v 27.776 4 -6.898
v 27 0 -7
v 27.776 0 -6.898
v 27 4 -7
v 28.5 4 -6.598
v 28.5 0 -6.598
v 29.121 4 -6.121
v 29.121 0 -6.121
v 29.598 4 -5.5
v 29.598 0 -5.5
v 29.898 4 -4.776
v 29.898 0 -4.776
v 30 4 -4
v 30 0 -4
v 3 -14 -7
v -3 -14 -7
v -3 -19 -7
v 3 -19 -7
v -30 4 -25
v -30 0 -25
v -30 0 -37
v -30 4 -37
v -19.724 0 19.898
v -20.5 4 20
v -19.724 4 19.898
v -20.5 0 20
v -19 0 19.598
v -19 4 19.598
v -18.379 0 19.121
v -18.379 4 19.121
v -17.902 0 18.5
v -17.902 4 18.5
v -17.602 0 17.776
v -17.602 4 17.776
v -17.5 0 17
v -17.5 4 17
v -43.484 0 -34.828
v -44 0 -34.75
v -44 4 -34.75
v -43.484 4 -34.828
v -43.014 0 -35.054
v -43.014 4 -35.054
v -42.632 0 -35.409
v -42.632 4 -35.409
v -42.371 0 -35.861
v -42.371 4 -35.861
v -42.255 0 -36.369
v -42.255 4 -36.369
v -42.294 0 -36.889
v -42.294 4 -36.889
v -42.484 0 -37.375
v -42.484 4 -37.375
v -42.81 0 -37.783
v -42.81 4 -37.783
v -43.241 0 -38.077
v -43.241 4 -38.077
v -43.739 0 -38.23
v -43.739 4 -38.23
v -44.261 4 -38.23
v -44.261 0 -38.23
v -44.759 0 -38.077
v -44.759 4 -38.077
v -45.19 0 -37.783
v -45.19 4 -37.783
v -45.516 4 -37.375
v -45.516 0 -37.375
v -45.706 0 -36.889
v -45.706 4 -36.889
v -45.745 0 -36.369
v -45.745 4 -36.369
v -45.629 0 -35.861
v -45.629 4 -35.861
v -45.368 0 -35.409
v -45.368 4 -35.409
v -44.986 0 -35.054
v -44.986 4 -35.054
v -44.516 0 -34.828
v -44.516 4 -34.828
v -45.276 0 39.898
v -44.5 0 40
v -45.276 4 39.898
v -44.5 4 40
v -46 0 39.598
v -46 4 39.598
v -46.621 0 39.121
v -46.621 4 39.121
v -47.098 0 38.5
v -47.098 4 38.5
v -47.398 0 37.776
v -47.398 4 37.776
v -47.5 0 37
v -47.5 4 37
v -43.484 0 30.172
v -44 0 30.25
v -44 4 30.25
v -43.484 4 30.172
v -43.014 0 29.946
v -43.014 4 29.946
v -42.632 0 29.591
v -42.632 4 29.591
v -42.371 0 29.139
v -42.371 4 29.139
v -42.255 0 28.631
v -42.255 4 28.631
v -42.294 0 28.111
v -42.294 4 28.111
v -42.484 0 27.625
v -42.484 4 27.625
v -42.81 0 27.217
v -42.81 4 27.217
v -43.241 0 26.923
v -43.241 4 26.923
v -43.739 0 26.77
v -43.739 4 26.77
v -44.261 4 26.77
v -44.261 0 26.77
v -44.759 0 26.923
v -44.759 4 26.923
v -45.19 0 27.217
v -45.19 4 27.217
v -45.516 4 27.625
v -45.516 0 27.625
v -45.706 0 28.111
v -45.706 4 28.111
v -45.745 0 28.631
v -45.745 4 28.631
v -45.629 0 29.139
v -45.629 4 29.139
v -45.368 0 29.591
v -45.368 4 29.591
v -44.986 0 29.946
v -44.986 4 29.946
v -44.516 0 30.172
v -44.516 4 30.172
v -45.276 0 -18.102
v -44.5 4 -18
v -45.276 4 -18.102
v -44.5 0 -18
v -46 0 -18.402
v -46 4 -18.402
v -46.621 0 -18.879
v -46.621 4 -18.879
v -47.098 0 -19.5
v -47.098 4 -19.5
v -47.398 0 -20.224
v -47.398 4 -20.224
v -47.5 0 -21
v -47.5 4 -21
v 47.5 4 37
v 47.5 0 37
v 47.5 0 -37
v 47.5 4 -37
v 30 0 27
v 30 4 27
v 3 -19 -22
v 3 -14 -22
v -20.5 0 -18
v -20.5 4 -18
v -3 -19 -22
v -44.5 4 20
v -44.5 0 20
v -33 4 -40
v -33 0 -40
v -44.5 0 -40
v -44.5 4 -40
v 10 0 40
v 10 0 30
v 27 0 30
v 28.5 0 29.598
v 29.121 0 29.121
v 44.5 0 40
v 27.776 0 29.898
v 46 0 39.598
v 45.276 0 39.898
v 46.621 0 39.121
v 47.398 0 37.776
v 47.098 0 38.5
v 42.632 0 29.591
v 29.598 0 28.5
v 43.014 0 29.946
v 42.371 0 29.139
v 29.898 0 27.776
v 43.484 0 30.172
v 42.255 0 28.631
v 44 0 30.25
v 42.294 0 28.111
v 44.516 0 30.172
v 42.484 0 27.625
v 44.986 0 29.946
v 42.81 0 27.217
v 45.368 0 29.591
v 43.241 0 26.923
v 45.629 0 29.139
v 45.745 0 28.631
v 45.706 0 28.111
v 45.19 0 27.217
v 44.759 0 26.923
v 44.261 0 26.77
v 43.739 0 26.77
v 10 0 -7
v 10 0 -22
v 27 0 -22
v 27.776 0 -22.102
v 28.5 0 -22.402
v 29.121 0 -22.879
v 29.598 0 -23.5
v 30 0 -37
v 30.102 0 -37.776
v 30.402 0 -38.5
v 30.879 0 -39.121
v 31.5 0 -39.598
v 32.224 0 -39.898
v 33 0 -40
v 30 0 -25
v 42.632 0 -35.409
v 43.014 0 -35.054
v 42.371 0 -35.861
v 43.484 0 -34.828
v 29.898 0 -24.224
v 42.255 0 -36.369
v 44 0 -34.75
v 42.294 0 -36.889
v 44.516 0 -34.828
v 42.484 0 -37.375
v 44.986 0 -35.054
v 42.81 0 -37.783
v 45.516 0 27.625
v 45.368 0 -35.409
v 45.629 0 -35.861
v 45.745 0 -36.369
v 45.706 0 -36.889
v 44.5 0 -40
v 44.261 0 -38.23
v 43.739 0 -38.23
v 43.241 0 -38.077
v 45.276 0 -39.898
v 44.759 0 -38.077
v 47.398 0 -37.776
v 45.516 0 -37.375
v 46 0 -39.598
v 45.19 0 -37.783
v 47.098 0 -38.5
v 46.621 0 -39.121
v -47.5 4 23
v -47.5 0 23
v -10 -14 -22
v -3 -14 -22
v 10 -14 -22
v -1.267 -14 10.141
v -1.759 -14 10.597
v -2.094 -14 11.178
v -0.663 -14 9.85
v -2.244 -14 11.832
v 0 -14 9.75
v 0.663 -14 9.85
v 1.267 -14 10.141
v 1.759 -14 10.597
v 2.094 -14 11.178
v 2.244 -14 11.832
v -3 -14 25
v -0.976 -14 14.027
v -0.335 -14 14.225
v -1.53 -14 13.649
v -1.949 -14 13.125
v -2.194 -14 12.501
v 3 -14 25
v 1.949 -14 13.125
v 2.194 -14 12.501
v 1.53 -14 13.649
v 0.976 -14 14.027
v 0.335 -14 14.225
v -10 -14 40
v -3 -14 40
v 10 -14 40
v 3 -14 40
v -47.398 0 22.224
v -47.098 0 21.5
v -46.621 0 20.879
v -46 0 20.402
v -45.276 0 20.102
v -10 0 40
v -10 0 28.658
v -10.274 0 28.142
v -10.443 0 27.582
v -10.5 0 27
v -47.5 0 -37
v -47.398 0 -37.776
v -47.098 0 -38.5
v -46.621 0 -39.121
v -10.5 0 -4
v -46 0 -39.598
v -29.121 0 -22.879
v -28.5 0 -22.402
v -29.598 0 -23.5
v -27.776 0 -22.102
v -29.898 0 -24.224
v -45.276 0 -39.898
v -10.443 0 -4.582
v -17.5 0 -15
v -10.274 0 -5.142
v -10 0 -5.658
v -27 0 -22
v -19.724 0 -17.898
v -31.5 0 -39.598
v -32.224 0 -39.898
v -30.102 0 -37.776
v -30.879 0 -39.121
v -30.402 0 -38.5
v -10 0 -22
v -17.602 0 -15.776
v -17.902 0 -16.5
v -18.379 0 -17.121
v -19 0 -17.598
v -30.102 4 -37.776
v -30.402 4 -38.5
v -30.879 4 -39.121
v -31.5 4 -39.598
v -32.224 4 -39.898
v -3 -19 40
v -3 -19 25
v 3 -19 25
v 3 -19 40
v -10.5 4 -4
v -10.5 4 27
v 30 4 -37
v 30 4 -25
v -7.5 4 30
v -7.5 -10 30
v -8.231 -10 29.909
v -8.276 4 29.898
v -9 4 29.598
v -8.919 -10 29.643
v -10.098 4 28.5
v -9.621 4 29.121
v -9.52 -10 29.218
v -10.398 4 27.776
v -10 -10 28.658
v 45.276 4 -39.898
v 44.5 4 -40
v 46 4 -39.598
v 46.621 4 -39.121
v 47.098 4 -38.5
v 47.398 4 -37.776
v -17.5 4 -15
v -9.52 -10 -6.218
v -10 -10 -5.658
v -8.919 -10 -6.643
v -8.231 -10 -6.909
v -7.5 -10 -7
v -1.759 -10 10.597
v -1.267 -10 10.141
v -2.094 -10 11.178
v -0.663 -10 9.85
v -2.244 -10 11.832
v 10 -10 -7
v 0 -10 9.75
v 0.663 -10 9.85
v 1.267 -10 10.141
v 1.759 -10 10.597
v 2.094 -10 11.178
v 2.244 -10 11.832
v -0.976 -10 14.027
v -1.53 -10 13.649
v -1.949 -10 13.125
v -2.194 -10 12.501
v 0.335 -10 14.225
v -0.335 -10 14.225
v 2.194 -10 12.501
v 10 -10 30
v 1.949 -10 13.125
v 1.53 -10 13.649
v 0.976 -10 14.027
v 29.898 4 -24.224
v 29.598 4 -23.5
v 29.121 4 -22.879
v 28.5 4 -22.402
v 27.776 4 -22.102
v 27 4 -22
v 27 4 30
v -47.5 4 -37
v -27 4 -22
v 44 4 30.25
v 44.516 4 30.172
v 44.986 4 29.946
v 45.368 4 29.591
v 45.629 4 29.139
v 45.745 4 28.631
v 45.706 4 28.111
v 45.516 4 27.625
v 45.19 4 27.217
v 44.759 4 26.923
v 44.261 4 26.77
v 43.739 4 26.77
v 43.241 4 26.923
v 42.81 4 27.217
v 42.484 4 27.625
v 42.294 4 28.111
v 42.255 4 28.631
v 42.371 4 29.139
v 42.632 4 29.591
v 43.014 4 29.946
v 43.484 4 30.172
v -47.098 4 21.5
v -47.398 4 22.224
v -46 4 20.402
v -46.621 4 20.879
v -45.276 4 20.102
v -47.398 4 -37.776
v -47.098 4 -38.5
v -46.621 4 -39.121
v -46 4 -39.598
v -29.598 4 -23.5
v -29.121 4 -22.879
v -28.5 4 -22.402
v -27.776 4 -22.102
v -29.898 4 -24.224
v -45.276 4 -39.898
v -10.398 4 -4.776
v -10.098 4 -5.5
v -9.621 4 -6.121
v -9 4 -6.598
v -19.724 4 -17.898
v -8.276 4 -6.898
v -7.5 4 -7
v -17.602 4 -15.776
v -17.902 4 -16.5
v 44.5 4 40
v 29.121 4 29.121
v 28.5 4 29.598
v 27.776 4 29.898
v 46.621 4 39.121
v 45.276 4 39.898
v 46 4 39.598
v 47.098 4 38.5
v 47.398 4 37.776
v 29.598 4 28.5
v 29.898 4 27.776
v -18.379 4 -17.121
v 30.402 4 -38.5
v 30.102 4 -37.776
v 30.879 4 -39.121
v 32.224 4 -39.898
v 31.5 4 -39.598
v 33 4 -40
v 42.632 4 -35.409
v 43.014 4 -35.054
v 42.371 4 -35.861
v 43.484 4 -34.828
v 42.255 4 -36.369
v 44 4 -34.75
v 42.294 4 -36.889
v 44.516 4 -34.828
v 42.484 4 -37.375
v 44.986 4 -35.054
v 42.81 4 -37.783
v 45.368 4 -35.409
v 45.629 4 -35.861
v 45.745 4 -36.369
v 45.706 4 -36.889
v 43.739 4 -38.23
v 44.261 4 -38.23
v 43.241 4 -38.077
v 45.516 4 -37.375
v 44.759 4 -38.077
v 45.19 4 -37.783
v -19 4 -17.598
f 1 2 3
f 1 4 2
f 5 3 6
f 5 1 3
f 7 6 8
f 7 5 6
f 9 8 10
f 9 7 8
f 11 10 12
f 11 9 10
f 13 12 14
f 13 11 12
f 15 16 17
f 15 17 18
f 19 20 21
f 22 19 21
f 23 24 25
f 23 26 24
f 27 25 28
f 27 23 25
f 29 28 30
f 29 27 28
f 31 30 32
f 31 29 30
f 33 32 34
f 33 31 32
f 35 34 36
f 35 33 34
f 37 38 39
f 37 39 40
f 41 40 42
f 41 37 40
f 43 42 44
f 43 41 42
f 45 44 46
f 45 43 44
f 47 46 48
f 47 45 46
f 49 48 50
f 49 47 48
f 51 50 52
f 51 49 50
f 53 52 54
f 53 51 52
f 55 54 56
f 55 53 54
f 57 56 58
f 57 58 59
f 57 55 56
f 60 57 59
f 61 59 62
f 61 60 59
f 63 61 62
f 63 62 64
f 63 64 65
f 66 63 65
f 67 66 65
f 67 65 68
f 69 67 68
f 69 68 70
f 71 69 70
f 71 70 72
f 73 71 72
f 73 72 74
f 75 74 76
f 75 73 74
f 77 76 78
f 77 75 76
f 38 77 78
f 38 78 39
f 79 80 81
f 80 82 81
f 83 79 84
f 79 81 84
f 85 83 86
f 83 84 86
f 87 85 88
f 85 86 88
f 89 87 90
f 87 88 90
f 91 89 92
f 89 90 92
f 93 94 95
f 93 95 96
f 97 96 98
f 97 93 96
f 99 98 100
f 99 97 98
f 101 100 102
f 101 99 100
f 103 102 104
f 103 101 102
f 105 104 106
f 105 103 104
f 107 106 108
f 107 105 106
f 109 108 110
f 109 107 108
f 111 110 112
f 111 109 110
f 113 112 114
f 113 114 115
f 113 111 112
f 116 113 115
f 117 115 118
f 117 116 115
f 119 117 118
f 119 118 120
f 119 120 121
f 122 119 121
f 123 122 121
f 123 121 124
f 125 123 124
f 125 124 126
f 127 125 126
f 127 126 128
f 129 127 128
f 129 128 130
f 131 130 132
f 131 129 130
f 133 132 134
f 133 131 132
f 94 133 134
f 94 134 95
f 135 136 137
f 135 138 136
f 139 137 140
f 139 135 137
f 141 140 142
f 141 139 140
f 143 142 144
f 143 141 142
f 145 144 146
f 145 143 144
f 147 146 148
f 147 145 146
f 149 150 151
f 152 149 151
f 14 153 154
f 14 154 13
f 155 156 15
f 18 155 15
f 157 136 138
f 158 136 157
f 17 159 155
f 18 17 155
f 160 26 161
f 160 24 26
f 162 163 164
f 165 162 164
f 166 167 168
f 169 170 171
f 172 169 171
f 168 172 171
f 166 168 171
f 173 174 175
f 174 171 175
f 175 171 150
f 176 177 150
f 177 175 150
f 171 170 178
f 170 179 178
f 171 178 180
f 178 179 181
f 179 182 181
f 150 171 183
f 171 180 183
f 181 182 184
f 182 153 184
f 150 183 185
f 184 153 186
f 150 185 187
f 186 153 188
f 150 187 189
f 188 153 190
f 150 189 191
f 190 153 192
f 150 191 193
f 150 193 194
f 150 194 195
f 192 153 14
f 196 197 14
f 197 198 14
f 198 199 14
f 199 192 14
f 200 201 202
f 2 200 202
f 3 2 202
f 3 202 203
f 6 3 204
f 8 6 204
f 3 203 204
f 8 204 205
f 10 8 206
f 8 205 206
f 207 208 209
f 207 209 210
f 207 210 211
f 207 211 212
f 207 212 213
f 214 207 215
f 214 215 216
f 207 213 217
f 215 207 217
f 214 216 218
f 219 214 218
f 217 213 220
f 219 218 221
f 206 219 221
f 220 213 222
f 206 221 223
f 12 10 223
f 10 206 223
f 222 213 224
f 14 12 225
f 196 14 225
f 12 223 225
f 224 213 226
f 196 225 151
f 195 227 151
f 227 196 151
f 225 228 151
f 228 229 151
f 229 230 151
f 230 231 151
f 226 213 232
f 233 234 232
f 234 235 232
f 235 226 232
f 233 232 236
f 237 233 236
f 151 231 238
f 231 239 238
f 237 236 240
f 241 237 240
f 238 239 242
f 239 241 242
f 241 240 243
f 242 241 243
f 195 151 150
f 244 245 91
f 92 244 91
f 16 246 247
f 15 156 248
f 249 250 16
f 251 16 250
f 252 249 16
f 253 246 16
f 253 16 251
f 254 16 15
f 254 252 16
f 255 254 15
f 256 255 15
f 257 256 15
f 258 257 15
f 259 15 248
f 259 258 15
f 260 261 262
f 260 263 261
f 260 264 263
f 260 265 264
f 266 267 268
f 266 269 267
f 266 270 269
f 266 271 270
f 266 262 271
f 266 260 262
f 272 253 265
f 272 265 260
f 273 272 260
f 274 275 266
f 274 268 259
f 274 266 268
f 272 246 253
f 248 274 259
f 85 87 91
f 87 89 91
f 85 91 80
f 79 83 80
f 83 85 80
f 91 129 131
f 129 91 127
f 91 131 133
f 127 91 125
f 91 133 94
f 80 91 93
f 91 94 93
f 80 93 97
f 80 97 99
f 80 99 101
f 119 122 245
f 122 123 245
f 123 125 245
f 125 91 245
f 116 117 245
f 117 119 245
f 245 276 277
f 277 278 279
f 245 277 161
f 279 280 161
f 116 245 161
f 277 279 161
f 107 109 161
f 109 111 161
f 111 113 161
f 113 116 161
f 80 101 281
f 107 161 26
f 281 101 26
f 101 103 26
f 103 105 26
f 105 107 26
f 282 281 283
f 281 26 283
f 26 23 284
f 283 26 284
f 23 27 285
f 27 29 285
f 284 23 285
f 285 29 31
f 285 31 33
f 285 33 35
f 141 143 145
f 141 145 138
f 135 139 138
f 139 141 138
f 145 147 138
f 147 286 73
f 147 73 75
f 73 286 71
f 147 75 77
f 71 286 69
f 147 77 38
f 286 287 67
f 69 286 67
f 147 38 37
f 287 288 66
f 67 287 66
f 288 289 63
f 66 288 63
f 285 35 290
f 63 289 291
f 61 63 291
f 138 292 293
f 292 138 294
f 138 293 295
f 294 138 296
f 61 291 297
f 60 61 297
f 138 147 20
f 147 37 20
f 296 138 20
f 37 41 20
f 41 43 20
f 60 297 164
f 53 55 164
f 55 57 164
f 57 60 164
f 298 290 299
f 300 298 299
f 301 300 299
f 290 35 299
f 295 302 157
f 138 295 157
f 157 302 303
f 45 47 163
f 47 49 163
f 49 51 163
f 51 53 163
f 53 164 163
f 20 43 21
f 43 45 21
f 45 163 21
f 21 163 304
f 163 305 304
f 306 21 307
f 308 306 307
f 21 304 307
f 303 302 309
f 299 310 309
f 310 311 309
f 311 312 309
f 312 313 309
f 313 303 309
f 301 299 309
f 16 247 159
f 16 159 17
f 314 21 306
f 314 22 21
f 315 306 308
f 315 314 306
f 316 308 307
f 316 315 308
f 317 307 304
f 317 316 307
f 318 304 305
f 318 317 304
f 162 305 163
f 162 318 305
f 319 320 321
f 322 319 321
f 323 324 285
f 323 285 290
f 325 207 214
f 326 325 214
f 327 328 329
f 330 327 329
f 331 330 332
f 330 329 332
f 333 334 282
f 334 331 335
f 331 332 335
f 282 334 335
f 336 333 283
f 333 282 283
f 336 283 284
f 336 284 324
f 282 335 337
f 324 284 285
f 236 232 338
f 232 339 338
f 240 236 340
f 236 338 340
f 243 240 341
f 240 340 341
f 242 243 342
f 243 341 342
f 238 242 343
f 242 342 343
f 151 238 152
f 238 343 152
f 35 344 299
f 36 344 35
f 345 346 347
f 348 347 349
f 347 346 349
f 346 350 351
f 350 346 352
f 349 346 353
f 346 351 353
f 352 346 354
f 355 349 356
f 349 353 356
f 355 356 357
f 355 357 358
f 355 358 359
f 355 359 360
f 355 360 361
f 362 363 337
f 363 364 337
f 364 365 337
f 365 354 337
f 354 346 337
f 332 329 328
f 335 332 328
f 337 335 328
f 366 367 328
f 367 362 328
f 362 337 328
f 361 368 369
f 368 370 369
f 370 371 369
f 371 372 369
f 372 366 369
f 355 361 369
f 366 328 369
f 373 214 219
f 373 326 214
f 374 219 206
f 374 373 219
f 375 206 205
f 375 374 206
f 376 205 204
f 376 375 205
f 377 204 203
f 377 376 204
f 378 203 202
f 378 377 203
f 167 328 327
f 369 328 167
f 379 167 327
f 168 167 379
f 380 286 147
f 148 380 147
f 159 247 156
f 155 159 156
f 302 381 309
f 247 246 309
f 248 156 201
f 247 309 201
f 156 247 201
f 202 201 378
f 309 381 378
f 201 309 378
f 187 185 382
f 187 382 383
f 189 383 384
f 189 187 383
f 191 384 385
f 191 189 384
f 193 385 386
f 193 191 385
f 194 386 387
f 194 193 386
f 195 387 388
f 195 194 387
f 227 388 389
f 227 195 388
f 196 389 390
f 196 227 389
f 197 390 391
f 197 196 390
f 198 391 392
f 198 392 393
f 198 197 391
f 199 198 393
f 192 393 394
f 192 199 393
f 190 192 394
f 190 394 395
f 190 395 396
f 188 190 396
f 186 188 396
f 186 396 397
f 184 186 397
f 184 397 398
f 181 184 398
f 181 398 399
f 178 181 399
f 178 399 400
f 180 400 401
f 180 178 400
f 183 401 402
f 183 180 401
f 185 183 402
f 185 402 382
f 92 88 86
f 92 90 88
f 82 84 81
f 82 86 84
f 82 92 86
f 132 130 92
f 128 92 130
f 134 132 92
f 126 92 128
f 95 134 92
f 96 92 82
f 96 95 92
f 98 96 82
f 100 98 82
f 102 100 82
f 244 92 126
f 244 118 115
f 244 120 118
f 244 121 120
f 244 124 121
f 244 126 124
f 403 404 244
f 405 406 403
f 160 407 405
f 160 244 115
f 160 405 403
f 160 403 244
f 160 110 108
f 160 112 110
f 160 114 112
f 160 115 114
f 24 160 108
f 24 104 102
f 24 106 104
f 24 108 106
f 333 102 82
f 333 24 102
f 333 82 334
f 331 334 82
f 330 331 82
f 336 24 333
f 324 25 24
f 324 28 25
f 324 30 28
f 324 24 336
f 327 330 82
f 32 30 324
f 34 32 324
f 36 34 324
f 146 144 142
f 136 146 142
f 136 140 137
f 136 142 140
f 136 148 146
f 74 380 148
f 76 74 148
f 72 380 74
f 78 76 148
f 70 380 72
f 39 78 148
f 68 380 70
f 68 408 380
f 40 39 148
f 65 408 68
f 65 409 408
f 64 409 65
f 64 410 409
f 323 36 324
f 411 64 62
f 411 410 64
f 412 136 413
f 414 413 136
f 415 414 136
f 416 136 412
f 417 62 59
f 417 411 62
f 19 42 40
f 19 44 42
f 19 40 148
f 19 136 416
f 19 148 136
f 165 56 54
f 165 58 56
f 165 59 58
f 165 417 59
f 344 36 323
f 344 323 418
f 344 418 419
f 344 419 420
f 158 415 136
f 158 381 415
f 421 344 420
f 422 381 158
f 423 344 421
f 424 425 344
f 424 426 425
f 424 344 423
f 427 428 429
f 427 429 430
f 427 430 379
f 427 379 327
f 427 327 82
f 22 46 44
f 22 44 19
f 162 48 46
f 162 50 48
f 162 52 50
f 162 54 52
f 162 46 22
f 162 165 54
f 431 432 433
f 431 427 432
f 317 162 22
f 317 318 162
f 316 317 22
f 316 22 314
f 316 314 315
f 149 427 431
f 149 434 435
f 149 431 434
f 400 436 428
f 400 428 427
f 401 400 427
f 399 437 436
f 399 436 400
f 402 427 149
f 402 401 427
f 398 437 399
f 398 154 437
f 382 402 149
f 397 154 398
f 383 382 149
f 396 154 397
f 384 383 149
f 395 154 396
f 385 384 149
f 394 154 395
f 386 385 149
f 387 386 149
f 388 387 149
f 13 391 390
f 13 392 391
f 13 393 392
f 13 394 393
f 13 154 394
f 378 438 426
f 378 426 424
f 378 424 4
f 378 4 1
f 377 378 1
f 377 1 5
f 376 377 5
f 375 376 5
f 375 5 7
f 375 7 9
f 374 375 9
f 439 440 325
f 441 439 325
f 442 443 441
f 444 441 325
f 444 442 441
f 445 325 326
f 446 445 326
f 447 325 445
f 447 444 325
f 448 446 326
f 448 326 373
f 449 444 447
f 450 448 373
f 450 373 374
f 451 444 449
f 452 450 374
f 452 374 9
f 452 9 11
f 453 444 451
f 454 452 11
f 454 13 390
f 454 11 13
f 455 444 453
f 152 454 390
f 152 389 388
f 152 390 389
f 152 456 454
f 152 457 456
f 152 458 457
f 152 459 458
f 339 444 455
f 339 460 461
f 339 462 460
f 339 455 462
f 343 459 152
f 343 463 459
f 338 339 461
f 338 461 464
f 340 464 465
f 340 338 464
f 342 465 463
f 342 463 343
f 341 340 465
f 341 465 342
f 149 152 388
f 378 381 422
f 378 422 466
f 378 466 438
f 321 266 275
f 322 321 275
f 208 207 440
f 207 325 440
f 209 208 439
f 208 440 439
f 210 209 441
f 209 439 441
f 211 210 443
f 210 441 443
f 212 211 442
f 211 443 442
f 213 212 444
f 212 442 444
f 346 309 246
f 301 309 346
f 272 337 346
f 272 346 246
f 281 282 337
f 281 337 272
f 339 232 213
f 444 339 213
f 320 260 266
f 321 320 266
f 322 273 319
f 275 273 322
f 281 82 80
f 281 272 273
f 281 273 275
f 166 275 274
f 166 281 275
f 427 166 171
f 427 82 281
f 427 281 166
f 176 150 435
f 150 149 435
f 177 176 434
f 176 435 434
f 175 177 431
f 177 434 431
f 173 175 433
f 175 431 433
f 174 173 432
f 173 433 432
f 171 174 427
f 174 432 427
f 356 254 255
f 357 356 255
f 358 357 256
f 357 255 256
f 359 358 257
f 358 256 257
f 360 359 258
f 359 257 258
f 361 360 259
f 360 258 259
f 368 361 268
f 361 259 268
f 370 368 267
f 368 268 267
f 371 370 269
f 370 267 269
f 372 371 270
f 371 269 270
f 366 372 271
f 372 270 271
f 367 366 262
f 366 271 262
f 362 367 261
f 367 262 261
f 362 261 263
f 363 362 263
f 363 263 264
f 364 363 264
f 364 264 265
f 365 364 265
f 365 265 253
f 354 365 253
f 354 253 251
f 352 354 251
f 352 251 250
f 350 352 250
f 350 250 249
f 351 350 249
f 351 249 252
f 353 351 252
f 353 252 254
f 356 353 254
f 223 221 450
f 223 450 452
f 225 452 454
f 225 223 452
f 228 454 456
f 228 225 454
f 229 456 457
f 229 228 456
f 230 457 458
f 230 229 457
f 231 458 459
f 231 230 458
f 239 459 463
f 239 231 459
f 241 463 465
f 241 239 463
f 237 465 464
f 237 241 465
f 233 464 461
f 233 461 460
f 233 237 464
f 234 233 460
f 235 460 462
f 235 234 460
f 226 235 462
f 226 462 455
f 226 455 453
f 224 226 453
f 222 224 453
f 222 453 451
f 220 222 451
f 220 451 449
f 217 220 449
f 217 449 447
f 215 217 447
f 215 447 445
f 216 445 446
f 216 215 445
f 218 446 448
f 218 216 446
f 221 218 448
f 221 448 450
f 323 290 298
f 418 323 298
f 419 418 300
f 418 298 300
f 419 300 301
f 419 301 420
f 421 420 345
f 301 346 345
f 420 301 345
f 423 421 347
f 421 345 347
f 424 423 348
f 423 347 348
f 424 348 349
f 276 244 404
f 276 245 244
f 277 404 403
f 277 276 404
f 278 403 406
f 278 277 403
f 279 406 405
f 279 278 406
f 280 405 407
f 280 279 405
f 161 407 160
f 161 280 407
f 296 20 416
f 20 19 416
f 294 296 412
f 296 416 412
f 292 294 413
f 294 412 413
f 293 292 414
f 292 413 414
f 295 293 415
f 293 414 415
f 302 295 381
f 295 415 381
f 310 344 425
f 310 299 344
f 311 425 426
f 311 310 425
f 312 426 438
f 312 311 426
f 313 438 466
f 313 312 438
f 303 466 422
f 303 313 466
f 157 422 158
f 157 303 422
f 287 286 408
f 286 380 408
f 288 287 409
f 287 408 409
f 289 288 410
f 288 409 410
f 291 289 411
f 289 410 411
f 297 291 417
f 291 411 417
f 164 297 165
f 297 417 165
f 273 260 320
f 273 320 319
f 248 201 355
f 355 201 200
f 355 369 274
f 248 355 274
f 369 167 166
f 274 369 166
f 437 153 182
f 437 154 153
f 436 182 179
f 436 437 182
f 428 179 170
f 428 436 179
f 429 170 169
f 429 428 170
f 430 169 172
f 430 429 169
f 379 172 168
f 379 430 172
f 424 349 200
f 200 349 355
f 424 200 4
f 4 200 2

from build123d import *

# Parameters (mm, degrees)
SKETCH_1_W          = 60
SKETCH_1_H          = 37
SKETCH_1_R          = 1.75
EXTRUDE_1_DEPTH     = 4
SKETCH_2_W          = 20
SKETCH_2_H          = 10
SKETCH_2_H_2        = 15
EXTRUDE_2_DEPTH     = 10
SKETCH_3_W          = 20
SKETCH_3_H          = 62
EXTRUDE_3_DEPTH     = 4
SKETCH_4_W          = 6
SKETCH_4_H          = 15
EXTRUDE_4_DEPTH     = 5
CUT_EXTRUDE_1_REACH = 66.655
SKETCH_4_3_R        = 2.25
SKETCH_5_W          = 30
SKETCH_5_H          = 38
CUT_EXTRUDE_2_DEPTH = 67.221220164
EXTRUDE_7_DEPTH     = 4
FILLET_1_R          = 3


with BuildPart() as part:
    # 草图1 → 凸台-拉伸1 (new body)
    with BuildSketch(Plane(origin=(0, 0, 0), x_dir=(1, 0, 0), z_dir=(0, 1, 0))):
        Polygon((-30, 22), (-30, 40), (-47.5, 40), (-47.5, -40), (47.5, -40), (47.5, 40), (30, 40), (30, 22), align=None)
        with Locations((0, -11.5)):
            Rectangle(SKETCH_1_W, SKETCH_1_H, mode=Mode.SUBTRACT)
        with Locations(Location((-44, 36.5, 0), (0, 0, 270))):
            Circle(SKETCH_1_R, mode=Mode.SUBTRACT)
        with Locations(Location((44, 36.5, 0), (0, 0, 270))):
            Circle(SKETCH_1_R, mode=Mode.SUBTRACT)
        with Locations(Location((-44, -28.5, 0), (0, 0, 270))):
            Circle(SKETCH_1_R, mode=Mode.SUBTRACT)
        with Locations(Location((44, -28.5, 0), (0, 0, 270))):
            Circle(SKETCH_1_R, mode=Mode.SUBTRACT)
    extrude(amount=EXTRUDE_1_DEPTH)

    # 草图2 → 凸台-拉伸2 (add)
    with BuildSketch(Plane.XZ):
        with Locations((0, 35)):
            Rectangle(SKETCH_2_W, SKETCH_2_H)
        with Locations((0, -14.5)):
            Rectangle(SKETCH_2_W, SKETCH_2_H_2)
    extrude(amount=EXTRUDE_2_DEPTH)

    # 草图3 → 凸台-拉伸3 (add)
    with BuildSketch(Plane.XZ.offset(10)):
        with Locations((0, 9)):
            Rectangle(SKETCH_3_W, SKETCH_3_H)
    extrude(amount=EXTRUDE_3_DEPTH)

    # 草图4 → 凸台-拉伸4 (add)
    with BuildSketch(Plane.XZ.offset(14)):
        with Locations((0, 32.5)):
            Rectangle(SKETCH_4_W, SKETCH_4_H)
        with Locations((0, -14.5)):
            Rectangle(SKETCH_4_W, SKETCH_4_H)
    extrude(amount=EXTRUDE_4_DEPTH)

    # 草图4<3> → 切除-拉伸1 (cut, up to next)
    with BuildSketch(Plane.XZ.offset(14), mode=Mode.PRIVATE) as cut_extrude_1_sk1:
        with Locations(Location((0, 12, 0), (0, 0, 270))):
            Circle(SKETCH_4_3_R)
    cut_extrude_1_tool1 = extrude(cut_extrude_1_sk1.sketch, amount=-CUT_EXTRUDE_1_REACH, mode=Mode.PRIVATE) & part.part
    add(cut_extrude_1_tool1.solids().sort_by_distance((0, -14, 12))[0], mode=Mode.SUBTRACT)

    # 草图5 → 切除-拉伸2 (cut, through all)
    with BuildSketch(Plane(origin=(0, 4, 0), x_dir=(1, 0, 0), z_dir=(0, 1, 0))):
        with Locations((-32.5, -1)):
            Rectangle(SKETCH_5_W, SKETCH_5_H)
    extrude(amount=-CUT_EXTRUDE_2_DEPTH, mode=Mode.SUBTRACT)

    # 草图6 → 凸台-拉伸7 (add)
    with BuildSketch(Plane(origin=(0, 4, 0), x_dir=(1, 0, 0), z_dir=(0, 1, 0))):
        Polygon((-10.5, 7), (-17.5, 7), (-17.5, -20), (-30, -20), (-30, -30), (-10.5, -30), align=None)
    extrude(amount=-EXTRUDE_7_DEPTH)

    # 圆角1
    fillet_1_edges = [part.edges().sort_by_distance(p)[0] for p in [
        (-30, 2, -22),
    ]]
    fillet(fillet_1_edges, radius=FILLET_1_R)
    fillet_1_2_edges = [part.edges().sort_by_distance(p)[0] for p in [
        (-30, 2, -40),
    ]]
    fillet(fillet_1_2_edges, radius=FILLET_1_R)
    fillet_1_3_edges = [part.edges().sort_by_distance(p)[0] for p in [
        (30, 2, -7),
    ]]
    fillet(fillet_1_3_edges, radius=FILLET_1_R)
    fillet_1_4_edges = [part.edges().sort_by_distance(p)[0] for p in [
        (30, 2, 30),
    ]]
    fillet(fillet_1_4_edges, radius=FILLET_1_R)
    fillet_1_5_edges = [part.edges().sort_by_distance(p)[0] for p in [
        (-10.5, 2, 30),
    ]]
    fillet(fillet_1_5_edges, radius=FILLET_1_R)
    fillet_1_6_edges = [part.edges().sort_by_distance(p)[0] for p in [
        (30, 2, -40),
    ]]
    fillet(fillet_1_6_edges, radius=FILLET_1_R)
    fillet_1_7_edges = [part.edges().sort_by_distance(p)[0] for p in [
        (30, 2, -22),
    ]]
    fillet(fillet_1_7_edges, radius=FILLET_1_R)
    fillet_1_8_edges = [part.edges().sort_by_distance(p)[0] for p in [
        (47.5, 2, -40),
    ]]
    fillet(fillet_1_8_edges, radius=FILLET_1_R)
    fillet_1_9_edges = [part.edges().sort_by_distance(p)[0] for p in [
        (47.5, 2, 40),
    ]]
    fillet(fillet_1_9_edges, radius=FILLET_1_R)
    fillet_1_10_edges = [part.edges().sort_by_distance(p)[0] for p in [
        (-47.5, 2, 40),
    ]]
    fillet(fillet_1_10_edges, radius=FILLET_1_R)
    fillet_1_11_edges = [part.edges().sort_by_distance(p)[0] for p in [
        (-47.5, 2, 20),
    ]]
    fillet(fillet_1_11_edges, radius=FILLET_1_R)
    fillet_1_12_edges = [part.edges().sort_by_distance(p)[0] for p in [
        (-17.5, 2, 20),
    ]]
    fillet(fillet_1_12_edges, radius=FILLET_1_R)
    fillet_1_13_edges = [part.edges().sort_by_distance(p)[0] for p in [
        (-17.5, 2, -18),
    ]]
    fillet(fillet_1_13_edges, radius=FILLET_1_R)
    fillet_1_14_edges = [part.edges().sort_by_distance(p)[0] for p in [
        (-47.5, 2, -18),
    ]]
    fillet(fillet_1_14_edges, radius=FILLET_1_R)
    fillet_1_15_edges = [part.edges().sort_by_distance(p)[0] for p in [
        (-47.5, 2, -40),
    ]]
    fillet(fillet_1_15_edges, radius=FILLET_1_R)
    fillet_1_16_edges = [part.edges().sort_by_distance(p)[0] for p in [
        (-10.5, 2, -7),
    ]]
    fillet(fillet_1_16_edges, radius=FILLET_1_R)


solid = part.part
